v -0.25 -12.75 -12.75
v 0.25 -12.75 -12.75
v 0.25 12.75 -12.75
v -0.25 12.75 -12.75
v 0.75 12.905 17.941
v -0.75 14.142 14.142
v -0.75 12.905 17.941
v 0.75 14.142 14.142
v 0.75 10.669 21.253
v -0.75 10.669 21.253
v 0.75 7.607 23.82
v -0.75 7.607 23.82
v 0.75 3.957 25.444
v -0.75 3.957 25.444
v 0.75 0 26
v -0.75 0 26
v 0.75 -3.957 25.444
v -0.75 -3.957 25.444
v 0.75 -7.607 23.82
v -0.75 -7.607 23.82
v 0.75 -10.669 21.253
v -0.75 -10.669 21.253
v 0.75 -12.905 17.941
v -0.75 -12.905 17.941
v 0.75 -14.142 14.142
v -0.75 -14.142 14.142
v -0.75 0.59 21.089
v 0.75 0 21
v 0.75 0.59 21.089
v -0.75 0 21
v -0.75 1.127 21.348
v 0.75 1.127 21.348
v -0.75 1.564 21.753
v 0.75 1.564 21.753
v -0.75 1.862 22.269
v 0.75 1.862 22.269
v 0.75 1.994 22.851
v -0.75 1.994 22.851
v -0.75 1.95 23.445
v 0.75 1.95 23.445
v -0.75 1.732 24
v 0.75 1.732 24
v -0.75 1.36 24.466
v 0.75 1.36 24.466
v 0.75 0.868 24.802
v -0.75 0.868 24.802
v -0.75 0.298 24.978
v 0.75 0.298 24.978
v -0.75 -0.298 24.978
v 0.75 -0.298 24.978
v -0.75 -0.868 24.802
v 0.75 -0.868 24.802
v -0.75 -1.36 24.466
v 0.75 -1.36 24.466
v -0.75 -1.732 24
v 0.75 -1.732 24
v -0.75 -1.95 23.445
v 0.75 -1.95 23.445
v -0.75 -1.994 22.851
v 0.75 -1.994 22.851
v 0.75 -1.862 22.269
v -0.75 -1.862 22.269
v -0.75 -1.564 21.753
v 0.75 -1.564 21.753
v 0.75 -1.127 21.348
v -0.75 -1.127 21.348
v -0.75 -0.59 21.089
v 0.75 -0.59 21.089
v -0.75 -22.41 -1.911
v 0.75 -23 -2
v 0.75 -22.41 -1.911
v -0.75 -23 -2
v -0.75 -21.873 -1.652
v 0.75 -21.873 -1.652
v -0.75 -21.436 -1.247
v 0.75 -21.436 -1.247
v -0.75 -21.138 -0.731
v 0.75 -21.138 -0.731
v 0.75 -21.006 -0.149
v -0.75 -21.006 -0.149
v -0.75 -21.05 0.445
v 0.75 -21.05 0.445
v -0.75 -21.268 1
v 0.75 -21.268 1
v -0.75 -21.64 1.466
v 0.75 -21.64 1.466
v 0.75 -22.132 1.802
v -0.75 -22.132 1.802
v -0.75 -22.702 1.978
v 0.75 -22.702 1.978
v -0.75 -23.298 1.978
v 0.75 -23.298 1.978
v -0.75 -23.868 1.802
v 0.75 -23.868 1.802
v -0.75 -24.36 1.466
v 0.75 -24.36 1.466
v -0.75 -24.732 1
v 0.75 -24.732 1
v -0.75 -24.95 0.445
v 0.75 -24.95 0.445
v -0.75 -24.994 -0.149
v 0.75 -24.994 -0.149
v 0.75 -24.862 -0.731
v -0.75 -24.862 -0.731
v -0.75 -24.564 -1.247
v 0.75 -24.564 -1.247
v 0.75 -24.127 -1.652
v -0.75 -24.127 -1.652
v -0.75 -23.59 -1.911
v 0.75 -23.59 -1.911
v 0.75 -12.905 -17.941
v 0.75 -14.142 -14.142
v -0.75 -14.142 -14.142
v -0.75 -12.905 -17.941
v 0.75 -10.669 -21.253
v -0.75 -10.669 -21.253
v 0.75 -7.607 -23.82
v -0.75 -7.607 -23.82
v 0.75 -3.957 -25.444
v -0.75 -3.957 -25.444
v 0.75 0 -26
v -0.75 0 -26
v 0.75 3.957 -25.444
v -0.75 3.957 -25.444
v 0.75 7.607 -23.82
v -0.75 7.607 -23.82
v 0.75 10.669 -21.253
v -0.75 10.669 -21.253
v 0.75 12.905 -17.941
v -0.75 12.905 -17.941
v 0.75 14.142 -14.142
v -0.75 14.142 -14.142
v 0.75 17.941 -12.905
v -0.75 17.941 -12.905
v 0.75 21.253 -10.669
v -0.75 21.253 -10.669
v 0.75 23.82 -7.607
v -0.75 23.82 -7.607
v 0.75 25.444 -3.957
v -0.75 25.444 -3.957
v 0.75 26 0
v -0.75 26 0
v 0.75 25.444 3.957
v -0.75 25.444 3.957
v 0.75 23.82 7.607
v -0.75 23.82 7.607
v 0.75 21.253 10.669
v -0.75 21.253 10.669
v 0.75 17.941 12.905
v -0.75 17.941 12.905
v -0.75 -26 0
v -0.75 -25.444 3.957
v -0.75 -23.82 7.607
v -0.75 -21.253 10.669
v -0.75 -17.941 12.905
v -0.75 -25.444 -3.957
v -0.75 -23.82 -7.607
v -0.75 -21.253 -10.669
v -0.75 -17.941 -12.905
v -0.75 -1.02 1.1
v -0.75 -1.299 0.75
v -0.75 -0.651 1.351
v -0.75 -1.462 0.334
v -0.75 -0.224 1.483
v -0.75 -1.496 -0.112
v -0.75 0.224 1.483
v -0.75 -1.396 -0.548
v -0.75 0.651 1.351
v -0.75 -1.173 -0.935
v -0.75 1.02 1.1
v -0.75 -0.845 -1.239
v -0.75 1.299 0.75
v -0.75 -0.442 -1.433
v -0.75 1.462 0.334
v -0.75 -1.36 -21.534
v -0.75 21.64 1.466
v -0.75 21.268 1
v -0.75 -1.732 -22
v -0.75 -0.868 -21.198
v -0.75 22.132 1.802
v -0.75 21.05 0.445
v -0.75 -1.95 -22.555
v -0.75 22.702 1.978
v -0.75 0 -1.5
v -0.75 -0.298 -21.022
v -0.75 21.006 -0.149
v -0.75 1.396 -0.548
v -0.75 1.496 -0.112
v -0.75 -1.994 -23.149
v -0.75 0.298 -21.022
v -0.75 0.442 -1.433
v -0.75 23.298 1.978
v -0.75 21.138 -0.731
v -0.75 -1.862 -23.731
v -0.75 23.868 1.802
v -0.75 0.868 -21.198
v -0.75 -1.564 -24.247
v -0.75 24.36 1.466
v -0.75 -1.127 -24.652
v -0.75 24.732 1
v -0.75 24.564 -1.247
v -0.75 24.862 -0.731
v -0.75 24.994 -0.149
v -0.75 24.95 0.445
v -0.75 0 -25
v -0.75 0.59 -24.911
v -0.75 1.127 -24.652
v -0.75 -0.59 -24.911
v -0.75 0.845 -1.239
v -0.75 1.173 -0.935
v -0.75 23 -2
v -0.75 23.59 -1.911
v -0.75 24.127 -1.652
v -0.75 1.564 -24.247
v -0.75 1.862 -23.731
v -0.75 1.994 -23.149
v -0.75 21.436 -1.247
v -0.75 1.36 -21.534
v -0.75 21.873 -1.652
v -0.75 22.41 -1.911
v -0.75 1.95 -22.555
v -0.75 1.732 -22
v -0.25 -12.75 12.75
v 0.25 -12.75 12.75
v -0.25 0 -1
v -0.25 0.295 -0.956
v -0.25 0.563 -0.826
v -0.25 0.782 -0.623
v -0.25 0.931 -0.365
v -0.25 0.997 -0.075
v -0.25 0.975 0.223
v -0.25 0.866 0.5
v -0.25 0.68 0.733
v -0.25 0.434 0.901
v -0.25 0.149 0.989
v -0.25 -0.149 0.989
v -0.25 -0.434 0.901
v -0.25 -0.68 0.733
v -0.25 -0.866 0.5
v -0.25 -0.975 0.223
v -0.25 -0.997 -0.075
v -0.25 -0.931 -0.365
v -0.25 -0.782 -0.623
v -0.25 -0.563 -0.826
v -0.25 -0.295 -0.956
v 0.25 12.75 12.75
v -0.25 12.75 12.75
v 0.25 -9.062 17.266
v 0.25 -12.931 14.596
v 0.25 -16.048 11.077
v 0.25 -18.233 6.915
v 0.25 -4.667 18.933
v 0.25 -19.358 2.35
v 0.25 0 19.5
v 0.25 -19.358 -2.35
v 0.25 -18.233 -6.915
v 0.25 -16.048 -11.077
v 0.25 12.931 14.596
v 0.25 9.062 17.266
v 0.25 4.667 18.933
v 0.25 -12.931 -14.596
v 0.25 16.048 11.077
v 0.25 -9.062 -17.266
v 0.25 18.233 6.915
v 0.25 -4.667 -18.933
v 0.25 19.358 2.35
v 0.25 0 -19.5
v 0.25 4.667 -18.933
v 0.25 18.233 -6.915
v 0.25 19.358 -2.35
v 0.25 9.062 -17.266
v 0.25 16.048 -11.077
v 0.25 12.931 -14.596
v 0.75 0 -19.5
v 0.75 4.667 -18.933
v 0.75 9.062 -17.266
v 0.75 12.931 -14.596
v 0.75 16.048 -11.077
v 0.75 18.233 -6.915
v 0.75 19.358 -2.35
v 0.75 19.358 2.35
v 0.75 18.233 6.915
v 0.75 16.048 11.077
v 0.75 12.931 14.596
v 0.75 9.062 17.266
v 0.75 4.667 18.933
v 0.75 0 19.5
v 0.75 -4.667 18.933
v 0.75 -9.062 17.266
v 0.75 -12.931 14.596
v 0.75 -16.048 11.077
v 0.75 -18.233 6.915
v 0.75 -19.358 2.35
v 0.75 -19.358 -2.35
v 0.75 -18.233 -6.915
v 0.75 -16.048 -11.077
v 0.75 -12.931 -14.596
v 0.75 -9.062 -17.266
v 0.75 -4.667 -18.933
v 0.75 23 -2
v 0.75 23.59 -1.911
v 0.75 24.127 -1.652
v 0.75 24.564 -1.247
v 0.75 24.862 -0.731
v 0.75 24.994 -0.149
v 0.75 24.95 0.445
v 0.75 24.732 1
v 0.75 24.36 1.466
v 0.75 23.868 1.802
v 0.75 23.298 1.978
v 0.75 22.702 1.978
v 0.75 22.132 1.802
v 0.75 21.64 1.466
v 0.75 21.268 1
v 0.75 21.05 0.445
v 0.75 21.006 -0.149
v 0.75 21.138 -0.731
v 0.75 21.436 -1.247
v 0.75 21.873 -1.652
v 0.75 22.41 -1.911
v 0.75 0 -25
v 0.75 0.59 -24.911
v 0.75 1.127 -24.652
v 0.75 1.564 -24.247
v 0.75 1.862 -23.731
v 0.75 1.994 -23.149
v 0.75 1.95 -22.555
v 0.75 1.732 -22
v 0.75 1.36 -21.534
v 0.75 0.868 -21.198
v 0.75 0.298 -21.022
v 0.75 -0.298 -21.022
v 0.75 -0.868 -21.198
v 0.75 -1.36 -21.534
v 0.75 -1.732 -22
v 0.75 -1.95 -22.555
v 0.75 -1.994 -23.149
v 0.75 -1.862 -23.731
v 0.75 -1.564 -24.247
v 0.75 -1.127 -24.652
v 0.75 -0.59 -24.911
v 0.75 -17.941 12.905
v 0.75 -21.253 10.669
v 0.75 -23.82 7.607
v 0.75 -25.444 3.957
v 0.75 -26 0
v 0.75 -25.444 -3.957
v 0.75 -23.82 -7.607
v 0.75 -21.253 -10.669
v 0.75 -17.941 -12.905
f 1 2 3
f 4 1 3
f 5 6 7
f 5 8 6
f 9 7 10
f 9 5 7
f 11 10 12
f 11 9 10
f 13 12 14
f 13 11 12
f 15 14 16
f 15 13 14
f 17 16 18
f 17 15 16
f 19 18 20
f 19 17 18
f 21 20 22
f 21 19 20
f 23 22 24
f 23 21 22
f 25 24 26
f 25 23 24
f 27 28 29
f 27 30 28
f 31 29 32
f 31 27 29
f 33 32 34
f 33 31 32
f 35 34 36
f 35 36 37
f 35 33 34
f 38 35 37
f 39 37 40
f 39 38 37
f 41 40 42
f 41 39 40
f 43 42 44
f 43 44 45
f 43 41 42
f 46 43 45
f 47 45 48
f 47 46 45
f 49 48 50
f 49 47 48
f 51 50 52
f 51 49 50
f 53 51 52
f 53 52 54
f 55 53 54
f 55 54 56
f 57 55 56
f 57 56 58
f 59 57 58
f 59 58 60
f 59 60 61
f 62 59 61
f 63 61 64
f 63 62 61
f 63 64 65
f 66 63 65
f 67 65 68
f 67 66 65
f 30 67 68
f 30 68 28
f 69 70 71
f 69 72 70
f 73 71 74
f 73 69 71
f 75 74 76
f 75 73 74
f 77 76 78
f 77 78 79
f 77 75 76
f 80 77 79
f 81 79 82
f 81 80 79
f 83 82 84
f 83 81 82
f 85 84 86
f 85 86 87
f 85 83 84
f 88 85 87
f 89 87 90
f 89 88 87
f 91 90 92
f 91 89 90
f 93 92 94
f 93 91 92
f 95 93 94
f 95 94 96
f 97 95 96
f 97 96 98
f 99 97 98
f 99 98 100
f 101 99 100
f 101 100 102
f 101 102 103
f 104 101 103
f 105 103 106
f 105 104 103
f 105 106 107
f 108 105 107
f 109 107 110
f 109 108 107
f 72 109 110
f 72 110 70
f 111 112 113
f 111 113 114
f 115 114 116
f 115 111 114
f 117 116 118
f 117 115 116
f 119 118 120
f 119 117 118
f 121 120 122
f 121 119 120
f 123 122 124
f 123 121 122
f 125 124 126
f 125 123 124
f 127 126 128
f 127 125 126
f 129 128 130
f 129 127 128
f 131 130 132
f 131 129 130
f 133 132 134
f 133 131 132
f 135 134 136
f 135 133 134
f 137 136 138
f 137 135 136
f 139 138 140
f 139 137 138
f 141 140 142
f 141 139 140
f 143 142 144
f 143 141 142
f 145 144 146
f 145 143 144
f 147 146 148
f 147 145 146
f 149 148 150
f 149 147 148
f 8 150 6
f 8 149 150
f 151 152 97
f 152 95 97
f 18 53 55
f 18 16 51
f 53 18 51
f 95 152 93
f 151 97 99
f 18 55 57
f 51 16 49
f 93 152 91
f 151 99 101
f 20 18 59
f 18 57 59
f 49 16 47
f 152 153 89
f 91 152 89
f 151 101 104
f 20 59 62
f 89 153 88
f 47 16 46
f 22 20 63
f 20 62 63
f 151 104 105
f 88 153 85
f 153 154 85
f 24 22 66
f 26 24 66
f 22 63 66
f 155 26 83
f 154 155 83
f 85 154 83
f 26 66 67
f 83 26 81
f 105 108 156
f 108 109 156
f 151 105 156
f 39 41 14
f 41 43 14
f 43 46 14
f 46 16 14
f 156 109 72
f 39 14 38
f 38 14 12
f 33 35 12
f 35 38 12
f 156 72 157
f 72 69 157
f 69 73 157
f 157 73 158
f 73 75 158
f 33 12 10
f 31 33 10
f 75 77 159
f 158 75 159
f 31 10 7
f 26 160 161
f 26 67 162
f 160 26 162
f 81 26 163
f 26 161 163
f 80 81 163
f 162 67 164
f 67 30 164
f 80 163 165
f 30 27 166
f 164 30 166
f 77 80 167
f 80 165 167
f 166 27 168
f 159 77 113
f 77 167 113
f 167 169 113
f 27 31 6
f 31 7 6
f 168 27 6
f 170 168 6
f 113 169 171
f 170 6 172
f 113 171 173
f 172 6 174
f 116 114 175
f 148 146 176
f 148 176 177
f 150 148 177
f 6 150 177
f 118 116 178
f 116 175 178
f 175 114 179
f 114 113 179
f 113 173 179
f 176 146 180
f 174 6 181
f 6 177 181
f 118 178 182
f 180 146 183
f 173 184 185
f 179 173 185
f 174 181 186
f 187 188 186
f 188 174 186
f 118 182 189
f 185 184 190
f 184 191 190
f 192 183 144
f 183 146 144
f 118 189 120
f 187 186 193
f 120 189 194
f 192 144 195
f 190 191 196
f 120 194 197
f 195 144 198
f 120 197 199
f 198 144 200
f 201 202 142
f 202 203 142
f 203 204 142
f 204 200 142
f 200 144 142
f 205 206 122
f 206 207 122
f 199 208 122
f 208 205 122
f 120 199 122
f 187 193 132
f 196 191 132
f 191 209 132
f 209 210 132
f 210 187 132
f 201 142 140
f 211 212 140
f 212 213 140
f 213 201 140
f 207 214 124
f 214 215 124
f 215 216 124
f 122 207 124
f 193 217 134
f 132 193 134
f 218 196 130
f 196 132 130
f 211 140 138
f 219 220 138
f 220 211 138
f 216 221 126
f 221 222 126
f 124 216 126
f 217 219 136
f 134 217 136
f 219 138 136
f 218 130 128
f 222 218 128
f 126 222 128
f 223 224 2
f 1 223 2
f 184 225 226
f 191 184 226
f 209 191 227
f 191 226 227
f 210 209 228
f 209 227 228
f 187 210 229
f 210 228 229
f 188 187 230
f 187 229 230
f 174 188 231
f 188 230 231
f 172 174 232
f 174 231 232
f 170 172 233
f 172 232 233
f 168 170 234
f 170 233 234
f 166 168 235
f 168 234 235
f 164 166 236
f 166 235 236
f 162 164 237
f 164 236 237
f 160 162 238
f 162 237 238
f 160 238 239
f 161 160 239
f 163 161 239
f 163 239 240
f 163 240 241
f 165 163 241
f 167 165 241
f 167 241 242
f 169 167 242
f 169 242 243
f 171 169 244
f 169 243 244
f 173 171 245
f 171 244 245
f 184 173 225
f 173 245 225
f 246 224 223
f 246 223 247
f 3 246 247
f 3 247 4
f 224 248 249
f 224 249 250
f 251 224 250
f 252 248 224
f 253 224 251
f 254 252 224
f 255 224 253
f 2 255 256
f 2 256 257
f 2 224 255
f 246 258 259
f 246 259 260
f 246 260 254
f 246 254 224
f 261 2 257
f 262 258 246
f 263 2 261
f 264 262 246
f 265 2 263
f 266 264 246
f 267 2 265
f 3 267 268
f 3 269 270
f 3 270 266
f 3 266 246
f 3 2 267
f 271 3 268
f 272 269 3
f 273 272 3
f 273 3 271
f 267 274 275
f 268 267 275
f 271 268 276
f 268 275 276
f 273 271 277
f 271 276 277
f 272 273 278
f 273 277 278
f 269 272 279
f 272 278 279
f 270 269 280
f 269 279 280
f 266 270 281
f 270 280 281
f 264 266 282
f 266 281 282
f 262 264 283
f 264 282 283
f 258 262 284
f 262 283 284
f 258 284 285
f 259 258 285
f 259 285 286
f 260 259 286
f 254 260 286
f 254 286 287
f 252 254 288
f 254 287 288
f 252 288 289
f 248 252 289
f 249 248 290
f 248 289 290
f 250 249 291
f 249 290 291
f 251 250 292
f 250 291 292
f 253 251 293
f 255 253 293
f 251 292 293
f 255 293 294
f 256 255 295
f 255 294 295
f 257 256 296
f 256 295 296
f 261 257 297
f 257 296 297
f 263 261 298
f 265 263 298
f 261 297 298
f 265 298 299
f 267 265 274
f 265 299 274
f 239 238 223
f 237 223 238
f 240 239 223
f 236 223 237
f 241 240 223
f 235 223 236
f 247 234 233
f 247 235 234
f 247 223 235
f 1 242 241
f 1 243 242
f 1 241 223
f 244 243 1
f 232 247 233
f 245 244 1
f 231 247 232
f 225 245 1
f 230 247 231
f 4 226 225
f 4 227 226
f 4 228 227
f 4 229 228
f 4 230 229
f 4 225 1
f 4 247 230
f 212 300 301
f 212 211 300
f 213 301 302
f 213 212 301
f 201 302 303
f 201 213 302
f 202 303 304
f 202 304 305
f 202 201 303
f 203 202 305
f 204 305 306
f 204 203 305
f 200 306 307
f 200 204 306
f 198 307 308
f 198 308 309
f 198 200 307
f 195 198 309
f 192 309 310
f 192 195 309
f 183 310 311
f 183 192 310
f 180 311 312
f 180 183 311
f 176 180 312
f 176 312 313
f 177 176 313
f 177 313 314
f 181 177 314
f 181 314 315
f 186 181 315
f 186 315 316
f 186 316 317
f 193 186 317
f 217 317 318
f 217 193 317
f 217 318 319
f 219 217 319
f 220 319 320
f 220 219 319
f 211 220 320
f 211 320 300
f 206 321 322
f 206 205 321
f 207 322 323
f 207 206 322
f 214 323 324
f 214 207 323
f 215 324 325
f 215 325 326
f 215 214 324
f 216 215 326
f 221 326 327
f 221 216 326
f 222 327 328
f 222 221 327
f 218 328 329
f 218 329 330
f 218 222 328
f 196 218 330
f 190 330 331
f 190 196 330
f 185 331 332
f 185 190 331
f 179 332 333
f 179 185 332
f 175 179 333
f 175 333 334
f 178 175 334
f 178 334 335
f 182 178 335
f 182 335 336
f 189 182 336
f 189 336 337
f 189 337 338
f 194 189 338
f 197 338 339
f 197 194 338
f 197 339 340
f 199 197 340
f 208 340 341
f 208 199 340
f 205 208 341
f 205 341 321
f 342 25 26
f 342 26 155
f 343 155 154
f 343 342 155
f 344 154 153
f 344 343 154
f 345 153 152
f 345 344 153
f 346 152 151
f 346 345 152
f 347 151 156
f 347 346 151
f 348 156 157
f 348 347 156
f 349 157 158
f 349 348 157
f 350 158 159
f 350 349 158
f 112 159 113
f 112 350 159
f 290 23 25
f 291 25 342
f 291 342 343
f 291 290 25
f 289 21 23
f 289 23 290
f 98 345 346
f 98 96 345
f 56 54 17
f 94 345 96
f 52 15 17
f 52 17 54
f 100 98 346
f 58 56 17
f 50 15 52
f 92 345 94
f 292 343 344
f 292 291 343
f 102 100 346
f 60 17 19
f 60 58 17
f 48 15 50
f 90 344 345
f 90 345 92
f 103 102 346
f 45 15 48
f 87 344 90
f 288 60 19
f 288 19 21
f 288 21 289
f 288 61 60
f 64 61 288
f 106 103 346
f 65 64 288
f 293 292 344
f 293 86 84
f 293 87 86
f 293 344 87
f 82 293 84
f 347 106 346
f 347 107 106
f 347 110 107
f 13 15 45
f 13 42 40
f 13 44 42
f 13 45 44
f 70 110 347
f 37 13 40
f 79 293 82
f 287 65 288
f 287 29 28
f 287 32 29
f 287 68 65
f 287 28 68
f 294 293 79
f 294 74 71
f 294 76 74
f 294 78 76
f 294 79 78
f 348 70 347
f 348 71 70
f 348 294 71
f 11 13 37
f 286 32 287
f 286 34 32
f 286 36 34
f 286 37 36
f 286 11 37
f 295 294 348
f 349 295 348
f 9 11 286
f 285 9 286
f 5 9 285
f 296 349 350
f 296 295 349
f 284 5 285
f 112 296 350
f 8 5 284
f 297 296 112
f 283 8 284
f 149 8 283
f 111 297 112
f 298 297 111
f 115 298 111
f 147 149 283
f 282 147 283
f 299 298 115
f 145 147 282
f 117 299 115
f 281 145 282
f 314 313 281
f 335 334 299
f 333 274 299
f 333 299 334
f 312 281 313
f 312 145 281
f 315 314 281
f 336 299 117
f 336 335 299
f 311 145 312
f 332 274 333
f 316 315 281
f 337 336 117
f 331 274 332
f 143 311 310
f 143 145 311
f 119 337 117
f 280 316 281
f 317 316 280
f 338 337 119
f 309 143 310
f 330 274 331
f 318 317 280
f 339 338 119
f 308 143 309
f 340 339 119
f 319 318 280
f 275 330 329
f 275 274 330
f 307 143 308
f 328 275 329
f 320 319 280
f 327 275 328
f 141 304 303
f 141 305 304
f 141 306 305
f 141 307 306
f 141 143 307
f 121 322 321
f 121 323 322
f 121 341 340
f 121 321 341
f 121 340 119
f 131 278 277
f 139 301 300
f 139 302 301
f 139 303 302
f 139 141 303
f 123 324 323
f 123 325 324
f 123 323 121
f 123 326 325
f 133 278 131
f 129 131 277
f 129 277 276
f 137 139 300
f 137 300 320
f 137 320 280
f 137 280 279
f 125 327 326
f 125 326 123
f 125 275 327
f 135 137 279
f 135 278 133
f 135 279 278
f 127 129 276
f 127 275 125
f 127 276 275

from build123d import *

# Parameters (mm, degrees)
SKETCH2_R          = 2
BODY_DEPTH         = 0.75
SKETCH3_R          = 19.5
O_RING_SEAT_DEPTH  = 0.5
SKETCH11_W         = 25.5
SKETCH11_H         = 25.5
MESH_RECESS_DEPTH  = 0.5
SKETCH12_R         = 0.5
CUT_EXTRUDE4_DEPTH = 37.783148315
CHAMFER1_SIZE      = 1


with BuildPart() as part:
    # Sketch2 → Body (new, symmetric)
    with BuildSketch(Plane(origin=(0, 0, 0), x_dir=(0, 0, -1), z_dir=(1, 0, 0))):
        with BuildLine():
            ThreePointArc((-14.142135624, 14.142135624), (-26, 0), (-14.142135624, -14.142135624))
            ThreePointArc((-14.142135624, -14.142135624), (0, -26), (14.142135624, -14.142135624))
            ThreePointArc((14.142135624, -14.142135624), (26, 0), (14.142135624, 14.142135624))
            ThreePointArc((14.142135624, 14.142135624), (0, 26), (-14.142135624, 14.142135624))
        make_face()
        with Locations((0, 23)):
            Circle(SKETCH2_R, mode=Mode.SUBTRACT)
        with Locations((23, 0)):
            Circle(SKETCH2_R, mode=Mode.SUBTRACT)
        with Locations((0, -23)):
            Circle(SKETCH2_R, mode=Mode.SUBTRACT)
        with Locations((-23, 0)):
            Circle(SKETCH2_R, mode=Mode.SUBTRACT)
    extrude(amount=BODY_DEPTH, both=True)

    # Sketch3 → O-Ring Seat (cut)
    with BuildSketch(Plane(origin=(0.75, 0, 0), x_dir=(0, 0, -1), z_dir=(1, 0, 0))):
        Circle(SKETCH3_R)
    extrude(amount=-O_RING_SEAT_DEPTH, mode=Mode.SUBTRACT)

    # Sketch11 → Mesh Recess (cut)
    with BuildSketch(Plane(origin=(0.25, 0, 0), x_dir=(0, 0, -1), z_dir=(1, 0, 0))):
        Rectangle(SKETCH11_W, SKETCH11_H)
    extrude(amount=-MESH_RECESS_DEPTH, mode=Mode.SUBTRACT)

    # Sketch12 → Cut-Extrude4 (cut, through all)
    with BuildSketch(Plane(origin=(-0.25, 0, 0), x_dir=(0, 0, -1), z_dir=(1, 0, 0))):
        Circle(SKETCH12_R)
    extrude(amount=-CUT_EXTRUDE4_DEPTH, mode=Mode.SUBTRACT)

    # Chamfer1
    # the kernel refuses this chamfer: 1 mm, written as the material it takes off along each edge
    with BuildSketch(Plane(origin=(-0.75, 0, 0), x_dir=(0, 0, -1), z_dir=(0, -1, 0))) as chamfer1_piece_1:
        Polygon((0.5 + CHAMFER1_SIZE, 0), (0.5, CHAMFER1_SIZE), (0.5, 0), align=None)
    revolve(axis=Axis((-0.75, 0, 0), (1, 0, 0)), mode=Mode.SUBTRACT)


solid = part.part
